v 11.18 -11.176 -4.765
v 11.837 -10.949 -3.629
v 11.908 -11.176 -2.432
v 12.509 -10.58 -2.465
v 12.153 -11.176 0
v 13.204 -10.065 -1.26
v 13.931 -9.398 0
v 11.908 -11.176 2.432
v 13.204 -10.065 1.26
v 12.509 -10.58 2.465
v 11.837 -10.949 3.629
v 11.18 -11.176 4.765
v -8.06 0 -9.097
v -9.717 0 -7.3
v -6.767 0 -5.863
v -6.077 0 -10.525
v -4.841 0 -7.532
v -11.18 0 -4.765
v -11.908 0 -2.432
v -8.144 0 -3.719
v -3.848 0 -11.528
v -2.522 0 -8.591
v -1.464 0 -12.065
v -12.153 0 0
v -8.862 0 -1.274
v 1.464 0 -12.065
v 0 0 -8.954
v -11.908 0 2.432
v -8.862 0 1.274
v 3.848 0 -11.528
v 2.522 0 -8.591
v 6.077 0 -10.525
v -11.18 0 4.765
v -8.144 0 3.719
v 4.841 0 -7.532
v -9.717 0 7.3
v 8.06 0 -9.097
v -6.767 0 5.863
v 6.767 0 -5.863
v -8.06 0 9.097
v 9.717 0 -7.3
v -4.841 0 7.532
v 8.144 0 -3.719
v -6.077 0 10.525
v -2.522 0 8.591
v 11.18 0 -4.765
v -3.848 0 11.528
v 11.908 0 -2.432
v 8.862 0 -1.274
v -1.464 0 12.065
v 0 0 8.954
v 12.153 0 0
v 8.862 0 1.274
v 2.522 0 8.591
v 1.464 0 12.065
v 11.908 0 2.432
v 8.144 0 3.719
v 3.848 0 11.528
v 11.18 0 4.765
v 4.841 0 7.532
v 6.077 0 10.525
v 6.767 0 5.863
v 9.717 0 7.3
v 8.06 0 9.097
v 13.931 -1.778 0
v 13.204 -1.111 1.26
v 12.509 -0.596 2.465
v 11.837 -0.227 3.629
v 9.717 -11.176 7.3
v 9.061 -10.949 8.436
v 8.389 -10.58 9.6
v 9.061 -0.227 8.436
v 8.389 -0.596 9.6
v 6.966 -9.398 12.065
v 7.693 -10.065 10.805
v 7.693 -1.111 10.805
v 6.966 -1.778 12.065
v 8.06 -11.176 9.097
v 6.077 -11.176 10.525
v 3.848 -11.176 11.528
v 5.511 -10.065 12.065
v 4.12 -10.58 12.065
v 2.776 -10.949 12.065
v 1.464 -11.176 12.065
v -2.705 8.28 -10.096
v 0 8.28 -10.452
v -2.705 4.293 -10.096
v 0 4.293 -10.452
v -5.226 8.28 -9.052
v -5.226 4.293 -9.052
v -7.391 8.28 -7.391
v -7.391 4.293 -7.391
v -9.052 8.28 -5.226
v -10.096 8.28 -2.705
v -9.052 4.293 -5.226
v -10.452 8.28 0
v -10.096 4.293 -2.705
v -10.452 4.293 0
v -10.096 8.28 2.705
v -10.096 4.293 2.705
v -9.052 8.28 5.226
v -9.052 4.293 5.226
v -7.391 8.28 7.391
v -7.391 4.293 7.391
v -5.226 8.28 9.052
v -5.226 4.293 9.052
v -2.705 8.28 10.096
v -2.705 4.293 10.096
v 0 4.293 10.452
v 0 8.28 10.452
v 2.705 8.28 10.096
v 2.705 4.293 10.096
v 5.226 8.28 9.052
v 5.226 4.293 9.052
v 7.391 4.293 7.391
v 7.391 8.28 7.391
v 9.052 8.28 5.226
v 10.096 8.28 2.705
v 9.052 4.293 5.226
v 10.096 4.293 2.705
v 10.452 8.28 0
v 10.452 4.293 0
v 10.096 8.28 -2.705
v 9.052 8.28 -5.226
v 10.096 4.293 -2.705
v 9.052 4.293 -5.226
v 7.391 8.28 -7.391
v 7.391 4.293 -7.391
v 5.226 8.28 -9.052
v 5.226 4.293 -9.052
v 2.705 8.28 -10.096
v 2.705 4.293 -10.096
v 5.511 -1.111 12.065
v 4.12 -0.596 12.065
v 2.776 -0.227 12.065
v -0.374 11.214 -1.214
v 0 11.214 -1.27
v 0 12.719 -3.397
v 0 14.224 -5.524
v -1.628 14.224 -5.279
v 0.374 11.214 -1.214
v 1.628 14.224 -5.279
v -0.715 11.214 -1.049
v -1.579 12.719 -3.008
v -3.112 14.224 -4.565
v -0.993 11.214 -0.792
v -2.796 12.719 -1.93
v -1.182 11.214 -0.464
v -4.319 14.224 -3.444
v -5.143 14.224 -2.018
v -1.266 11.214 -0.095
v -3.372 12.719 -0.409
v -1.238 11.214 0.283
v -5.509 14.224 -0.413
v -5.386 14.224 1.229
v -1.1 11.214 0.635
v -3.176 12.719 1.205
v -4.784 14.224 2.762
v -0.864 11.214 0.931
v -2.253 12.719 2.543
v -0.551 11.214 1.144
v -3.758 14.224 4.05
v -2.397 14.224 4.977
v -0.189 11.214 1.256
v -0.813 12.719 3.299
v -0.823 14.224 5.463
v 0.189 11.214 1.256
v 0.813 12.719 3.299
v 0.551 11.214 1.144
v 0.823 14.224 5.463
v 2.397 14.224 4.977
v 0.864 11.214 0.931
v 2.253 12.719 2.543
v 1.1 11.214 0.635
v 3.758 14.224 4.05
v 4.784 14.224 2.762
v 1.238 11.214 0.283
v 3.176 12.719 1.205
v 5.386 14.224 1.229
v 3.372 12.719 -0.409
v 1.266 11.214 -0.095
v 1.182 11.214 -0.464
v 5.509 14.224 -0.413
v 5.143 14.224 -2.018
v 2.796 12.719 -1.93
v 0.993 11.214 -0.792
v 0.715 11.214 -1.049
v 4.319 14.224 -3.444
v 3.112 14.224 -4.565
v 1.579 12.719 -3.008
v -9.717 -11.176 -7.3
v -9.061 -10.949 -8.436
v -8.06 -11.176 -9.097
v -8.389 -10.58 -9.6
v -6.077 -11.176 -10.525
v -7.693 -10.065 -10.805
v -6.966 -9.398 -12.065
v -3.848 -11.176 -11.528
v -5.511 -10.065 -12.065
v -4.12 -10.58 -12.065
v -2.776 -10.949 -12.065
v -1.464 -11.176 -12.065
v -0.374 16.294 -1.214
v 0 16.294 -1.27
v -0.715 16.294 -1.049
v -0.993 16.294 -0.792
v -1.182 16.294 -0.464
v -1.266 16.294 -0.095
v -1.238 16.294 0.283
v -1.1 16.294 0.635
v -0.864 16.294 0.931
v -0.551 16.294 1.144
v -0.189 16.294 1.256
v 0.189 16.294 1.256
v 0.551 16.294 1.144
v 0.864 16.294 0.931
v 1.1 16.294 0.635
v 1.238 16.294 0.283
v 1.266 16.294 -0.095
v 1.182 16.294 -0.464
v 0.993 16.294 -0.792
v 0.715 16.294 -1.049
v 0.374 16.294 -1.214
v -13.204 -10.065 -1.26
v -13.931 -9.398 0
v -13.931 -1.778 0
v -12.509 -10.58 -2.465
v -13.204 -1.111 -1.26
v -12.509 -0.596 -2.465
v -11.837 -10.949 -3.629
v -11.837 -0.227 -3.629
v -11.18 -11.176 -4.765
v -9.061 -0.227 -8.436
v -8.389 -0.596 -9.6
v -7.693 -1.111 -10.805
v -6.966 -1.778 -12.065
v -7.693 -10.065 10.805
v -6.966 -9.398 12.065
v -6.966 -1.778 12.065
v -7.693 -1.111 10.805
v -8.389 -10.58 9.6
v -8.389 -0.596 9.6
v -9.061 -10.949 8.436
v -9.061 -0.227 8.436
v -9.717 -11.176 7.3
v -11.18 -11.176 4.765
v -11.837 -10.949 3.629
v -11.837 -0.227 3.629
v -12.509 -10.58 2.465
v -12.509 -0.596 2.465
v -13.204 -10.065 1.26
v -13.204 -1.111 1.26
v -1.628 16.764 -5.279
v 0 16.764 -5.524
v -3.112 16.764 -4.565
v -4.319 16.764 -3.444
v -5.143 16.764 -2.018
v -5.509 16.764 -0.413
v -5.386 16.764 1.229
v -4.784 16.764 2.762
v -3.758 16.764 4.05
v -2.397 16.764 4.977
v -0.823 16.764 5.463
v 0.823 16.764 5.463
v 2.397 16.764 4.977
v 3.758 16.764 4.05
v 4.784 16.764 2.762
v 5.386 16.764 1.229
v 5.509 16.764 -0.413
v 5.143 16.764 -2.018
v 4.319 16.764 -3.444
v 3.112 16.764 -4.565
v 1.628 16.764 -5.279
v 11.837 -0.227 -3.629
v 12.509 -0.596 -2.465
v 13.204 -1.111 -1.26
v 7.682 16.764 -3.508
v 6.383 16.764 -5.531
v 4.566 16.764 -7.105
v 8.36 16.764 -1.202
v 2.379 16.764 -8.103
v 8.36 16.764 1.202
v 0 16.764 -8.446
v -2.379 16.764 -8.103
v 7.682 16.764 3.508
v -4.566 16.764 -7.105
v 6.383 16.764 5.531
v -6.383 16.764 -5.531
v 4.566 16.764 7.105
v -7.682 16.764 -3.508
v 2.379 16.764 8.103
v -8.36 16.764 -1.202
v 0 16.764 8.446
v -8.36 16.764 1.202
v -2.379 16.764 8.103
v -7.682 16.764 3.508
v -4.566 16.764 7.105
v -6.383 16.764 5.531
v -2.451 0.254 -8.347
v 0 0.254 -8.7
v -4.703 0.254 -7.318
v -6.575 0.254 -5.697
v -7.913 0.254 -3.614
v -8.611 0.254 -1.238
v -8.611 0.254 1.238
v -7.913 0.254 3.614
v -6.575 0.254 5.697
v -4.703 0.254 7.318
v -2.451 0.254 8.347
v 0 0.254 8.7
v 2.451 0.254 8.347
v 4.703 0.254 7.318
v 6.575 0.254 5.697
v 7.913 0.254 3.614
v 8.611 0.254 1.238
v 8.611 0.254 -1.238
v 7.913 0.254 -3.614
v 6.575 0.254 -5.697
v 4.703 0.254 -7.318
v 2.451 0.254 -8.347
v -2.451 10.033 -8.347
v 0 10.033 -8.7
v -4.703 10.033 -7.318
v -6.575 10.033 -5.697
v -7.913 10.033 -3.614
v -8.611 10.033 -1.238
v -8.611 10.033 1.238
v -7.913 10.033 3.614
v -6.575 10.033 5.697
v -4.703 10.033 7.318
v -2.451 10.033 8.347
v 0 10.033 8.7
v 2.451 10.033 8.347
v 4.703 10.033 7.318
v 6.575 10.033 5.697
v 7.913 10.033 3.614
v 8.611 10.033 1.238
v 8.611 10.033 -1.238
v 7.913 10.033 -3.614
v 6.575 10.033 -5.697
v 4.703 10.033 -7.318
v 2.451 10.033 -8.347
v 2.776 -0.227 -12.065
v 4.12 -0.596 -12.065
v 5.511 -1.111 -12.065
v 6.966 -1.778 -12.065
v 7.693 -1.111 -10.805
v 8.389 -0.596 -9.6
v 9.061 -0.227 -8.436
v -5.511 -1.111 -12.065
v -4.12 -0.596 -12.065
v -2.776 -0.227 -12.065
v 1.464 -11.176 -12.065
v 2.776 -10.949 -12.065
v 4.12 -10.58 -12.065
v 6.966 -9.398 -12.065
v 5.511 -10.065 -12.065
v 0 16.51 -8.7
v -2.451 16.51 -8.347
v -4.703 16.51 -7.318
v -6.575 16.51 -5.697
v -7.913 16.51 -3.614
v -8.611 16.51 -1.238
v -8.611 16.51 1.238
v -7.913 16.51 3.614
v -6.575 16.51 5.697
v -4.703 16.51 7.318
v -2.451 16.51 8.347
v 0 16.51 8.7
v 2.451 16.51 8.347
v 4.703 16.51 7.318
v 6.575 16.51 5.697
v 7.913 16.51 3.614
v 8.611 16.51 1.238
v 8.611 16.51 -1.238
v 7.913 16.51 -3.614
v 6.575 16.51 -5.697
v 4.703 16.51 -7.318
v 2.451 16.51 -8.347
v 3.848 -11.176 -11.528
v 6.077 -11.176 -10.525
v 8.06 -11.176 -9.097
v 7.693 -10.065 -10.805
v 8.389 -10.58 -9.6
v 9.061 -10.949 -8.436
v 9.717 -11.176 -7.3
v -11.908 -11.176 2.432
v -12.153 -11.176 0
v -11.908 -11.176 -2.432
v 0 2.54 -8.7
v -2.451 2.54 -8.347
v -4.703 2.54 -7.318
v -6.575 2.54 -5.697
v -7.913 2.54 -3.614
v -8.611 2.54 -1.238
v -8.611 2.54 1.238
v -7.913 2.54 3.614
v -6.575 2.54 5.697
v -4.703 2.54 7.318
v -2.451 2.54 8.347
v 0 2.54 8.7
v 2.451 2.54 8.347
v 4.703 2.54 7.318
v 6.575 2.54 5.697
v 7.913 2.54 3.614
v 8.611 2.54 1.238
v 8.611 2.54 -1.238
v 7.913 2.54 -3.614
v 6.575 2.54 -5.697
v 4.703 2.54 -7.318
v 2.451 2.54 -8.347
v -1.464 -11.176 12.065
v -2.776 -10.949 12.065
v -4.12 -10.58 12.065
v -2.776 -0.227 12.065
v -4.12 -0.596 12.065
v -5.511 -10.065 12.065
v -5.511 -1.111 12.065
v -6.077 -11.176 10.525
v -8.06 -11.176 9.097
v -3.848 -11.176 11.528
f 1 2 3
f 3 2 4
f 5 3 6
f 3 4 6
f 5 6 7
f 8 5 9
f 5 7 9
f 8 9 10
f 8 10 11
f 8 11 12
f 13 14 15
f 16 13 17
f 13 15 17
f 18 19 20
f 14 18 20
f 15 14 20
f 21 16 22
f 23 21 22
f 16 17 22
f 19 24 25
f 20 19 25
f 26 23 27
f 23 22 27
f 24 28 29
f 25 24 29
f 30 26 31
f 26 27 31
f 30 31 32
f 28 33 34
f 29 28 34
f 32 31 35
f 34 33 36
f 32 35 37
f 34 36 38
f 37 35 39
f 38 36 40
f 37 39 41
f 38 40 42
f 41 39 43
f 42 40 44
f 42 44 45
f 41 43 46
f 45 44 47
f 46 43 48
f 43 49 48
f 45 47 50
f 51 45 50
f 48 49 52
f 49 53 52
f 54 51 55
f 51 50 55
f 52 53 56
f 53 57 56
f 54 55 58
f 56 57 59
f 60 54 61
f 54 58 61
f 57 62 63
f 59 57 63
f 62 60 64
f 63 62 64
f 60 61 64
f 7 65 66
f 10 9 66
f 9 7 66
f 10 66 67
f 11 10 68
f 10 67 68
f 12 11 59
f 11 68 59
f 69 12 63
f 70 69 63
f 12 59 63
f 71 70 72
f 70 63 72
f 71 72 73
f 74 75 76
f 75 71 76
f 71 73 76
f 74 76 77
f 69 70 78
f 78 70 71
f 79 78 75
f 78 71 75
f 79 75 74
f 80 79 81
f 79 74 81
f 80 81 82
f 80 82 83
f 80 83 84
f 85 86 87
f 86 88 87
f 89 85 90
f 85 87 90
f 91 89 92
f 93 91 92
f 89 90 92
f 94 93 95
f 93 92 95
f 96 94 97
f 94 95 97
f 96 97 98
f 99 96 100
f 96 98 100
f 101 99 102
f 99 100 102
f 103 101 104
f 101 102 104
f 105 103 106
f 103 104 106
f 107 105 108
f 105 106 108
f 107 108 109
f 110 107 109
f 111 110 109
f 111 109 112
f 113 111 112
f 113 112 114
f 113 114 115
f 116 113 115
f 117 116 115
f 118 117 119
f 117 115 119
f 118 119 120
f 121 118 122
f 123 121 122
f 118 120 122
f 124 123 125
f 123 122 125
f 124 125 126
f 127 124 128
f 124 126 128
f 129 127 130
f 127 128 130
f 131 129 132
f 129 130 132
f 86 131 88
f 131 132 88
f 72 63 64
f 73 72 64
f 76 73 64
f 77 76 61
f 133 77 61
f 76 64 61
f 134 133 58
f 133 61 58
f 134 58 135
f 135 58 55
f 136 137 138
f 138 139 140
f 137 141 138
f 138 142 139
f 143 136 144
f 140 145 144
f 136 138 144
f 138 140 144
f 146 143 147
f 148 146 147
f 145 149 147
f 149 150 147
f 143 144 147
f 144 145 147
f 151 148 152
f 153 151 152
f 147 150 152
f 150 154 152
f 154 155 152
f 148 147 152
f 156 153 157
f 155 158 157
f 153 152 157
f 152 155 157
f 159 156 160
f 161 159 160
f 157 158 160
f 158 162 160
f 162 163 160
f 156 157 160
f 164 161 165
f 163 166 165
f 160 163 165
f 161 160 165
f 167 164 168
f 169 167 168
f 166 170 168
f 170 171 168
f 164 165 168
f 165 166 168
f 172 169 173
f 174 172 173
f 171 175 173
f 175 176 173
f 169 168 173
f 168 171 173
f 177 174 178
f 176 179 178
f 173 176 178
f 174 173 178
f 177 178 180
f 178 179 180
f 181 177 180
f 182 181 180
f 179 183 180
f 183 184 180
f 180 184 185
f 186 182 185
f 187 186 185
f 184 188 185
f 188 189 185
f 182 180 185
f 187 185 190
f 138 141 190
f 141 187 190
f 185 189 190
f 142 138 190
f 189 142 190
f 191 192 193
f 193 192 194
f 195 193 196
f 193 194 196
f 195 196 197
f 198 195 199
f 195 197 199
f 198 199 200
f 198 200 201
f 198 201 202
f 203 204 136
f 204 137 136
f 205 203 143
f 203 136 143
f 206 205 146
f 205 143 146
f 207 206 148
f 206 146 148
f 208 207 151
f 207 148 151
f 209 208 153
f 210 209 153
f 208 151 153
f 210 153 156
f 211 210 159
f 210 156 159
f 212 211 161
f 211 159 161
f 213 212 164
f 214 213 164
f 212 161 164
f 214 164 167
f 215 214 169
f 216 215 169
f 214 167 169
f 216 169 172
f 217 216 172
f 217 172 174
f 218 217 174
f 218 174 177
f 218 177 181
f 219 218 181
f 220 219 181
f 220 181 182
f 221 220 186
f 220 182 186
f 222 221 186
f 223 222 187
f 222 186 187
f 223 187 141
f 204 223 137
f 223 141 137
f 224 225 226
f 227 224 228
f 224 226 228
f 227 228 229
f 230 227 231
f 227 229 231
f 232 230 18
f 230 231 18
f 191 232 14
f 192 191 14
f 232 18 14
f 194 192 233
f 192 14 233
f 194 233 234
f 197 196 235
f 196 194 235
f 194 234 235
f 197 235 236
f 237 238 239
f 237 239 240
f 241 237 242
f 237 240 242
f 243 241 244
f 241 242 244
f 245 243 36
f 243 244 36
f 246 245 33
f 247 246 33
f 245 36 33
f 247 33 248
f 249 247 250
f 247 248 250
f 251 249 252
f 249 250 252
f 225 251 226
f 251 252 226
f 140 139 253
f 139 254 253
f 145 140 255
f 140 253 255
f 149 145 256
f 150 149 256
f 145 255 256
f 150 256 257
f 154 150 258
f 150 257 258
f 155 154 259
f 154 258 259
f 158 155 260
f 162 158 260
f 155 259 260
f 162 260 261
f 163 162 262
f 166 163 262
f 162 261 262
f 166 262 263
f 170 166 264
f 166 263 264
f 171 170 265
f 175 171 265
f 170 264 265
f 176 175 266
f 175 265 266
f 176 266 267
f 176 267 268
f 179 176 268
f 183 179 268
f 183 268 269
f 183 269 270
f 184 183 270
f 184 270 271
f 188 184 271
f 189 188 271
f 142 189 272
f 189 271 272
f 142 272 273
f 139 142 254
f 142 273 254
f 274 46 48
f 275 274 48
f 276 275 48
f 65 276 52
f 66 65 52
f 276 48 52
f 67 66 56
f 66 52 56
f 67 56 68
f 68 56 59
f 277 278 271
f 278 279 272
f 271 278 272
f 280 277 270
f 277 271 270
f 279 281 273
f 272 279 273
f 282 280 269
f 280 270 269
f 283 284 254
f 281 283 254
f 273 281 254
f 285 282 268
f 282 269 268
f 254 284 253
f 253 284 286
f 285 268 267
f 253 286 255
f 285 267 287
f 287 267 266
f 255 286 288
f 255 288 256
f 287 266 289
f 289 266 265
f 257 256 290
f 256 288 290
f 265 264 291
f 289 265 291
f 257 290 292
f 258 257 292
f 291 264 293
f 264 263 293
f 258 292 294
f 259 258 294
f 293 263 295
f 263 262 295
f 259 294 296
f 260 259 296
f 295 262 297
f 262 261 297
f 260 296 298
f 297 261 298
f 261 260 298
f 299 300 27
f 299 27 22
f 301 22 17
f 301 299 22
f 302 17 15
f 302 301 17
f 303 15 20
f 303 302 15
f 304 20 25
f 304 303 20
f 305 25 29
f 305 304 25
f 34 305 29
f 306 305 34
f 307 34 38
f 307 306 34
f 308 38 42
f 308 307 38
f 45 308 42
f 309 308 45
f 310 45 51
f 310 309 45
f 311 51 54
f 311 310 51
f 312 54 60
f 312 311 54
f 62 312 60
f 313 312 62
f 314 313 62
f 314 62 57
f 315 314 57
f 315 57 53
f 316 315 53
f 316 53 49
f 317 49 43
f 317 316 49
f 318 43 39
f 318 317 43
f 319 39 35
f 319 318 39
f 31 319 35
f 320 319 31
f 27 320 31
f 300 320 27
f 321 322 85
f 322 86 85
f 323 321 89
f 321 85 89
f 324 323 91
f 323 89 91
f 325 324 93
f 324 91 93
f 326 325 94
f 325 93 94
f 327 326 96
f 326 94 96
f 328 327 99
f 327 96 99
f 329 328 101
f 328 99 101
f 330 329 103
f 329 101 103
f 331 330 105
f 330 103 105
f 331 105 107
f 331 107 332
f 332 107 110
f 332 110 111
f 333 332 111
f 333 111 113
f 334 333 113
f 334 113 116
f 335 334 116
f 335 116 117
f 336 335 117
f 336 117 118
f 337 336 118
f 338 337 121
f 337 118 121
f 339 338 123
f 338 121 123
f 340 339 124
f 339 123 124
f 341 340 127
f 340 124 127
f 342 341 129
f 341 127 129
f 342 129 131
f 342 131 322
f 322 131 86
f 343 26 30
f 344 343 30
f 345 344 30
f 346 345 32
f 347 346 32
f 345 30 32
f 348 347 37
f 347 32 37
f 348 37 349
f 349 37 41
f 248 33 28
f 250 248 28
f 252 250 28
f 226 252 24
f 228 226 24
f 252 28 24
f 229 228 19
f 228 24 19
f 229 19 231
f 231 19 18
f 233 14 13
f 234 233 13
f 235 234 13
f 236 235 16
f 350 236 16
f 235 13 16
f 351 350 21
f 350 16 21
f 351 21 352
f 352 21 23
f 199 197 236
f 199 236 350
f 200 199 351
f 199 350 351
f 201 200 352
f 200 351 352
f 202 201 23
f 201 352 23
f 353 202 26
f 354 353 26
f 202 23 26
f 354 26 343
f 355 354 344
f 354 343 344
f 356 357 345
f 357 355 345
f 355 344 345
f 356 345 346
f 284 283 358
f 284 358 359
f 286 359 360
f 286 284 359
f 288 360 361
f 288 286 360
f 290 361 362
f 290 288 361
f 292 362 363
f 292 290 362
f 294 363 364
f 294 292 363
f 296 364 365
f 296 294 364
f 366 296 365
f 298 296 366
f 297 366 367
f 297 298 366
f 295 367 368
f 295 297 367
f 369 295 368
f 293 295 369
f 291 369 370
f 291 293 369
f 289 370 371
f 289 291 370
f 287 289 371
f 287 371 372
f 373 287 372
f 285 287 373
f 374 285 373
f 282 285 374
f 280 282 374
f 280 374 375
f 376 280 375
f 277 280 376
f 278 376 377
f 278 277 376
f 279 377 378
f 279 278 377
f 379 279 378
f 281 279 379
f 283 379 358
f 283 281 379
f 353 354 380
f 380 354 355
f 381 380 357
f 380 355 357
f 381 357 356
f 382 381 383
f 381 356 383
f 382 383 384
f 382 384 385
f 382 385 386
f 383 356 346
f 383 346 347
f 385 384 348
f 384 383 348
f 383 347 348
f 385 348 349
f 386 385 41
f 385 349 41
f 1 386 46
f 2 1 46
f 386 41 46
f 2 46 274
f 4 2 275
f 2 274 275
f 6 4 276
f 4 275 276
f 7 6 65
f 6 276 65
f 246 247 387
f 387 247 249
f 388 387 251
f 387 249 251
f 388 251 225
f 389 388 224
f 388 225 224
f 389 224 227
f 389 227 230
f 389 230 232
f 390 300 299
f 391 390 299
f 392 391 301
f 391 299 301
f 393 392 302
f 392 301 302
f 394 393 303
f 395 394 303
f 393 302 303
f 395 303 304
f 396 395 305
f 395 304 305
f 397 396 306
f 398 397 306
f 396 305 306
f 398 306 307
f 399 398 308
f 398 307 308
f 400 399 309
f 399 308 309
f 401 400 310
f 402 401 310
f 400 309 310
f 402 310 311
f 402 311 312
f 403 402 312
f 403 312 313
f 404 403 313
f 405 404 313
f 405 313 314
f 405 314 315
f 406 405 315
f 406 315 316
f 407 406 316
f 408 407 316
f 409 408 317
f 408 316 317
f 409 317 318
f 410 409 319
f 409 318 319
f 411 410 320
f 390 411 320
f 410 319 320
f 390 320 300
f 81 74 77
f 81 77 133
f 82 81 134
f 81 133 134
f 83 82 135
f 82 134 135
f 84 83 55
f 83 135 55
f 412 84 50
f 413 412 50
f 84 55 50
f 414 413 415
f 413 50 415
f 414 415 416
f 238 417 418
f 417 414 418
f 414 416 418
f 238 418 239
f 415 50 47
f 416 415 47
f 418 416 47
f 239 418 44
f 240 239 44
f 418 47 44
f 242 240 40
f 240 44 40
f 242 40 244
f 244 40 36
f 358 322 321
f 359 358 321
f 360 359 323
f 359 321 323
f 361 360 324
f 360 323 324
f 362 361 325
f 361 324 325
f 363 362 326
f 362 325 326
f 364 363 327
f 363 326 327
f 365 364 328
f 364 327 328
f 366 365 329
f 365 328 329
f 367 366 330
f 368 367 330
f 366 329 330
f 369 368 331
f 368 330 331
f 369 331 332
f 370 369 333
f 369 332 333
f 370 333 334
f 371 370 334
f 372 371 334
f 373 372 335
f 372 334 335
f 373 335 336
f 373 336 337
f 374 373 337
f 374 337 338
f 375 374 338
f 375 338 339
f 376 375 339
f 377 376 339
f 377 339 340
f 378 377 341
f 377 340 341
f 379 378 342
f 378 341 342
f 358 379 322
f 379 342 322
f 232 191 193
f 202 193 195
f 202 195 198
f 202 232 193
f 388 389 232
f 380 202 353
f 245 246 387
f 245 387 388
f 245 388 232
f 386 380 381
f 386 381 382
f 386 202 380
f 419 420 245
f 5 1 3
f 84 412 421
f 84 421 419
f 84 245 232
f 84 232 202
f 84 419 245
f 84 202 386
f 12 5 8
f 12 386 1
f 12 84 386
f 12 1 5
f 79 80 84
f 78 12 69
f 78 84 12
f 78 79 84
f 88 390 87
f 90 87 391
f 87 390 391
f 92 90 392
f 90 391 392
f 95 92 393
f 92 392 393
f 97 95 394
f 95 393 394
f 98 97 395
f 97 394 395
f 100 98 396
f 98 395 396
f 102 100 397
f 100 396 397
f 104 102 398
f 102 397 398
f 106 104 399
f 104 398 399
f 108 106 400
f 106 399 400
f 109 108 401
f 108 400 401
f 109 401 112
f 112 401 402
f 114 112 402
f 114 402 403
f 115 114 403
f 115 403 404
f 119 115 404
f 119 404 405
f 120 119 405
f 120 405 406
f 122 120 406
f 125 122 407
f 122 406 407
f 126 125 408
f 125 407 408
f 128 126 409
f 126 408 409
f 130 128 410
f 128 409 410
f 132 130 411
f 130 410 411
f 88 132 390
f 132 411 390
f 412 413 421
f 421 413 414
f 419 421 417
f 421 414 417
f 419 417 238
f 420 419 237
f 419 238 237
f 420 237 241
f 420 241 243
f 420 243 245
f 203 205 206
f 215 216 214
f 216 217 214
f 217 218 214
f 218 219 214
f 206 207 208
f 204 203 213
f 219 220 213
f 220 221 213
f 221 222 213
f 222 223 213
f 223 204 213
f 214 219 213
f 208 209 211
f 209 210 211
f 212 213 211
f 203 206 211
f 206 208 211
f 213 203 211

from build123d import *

# Parameters (mm, degrees)
BOSS_EXTRUDE1_DEPTH = 11.176
CHAMFER1_SIZE       = 0.254


with BuildPart() as part:
    # Sketch2 → Revolve1 (revolve)
    with BuildSketch(Plane.XY, mode=Mode.PRIVATE) as revolve1_sk:
        Polygon((0, 0), (0, 16.2941), (1.27, 16.2941), (1.27, 11.2141), (5.5245, 14.224), (5.5245, 16.764), (8.6995, 16.764), (8.6995, 10.033), (10.4521, 8.2804), (10.4521, 4.2926), (8.6995, 2.54), (8.6995, 0), align=None)
    revolve(revolve1_sk.sketch.rotate(Axis((0, 0, 0), (0, 1, 0)), 90), axis=Axis((0, 0, 0), (0, 1, 0)))

    # Sketch3 → Boss-Extrude1 (add)
    with BuildSketch(Plane.XZ):
        Polygon((13.931461996, 0), (6.965730998, 12.065), (-6.965730998, 12.065), (-13.931461996, 0), (-6.965730998, -12.065), (6.965730998, -12.065), align=None)
    extrude(amount=BOSS_EXTRUDE1_DEPTH)

    # Sketch5 → Cut-Revolve1 (revolve, cut)
    with BuildSketch(Plane.XY, mode=Mode.PRIVATE) as cut_revolve1_sk:
        Polygon((13.931461996, -1.778), (12.153461996, 0), (16.589687484, 0), (16.589687484, -11.176), (12.153461996, -11.176), (13.931461996, -9.398), align=None)
    revolve(cut_revolve1_sk.sketch.rotate(Axis((0, 0, 0), (0, -1, 0)), 90), axis=Axis((0, 0, 0), (0, -1, 0)), mode=Mode.SUBTRACT)

    # Chamfer1
    chamfer1_edges = [part.edges().sort_by_distance(p)[0] for p in [
        (0, 16.764, 8.6995),
        (0, 0, 8.6995),
    ]]
    chamfer(chamfer1_edges, length=CHAMFER1_SIZE)


solid = part.part
